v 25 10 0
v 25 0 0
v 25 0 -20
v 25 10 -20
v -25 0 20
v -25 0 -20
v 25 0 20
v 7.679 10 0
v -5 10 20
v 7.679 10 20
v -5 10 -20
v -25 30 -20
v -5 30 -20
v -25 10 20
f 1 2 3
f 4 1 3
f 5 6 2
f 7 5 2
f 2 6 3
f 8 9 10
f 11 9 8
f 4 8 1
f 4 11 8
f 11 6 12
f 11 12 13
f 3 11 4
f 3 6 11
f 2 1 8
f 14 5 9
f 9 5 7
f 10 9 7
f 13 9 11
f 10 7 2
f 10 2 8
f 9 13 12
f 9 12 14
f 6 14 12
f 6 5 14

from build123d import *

# Parameters (mm, degrees)
SKETCH1_W           = 50
SKETCH1_H           = 40
BOSS_EXTRUDE1_DEPTH = 10
CUT_EXTRUDE1_DEPTH  = 20
SKETCH3_W           = 20
SKETCH3_H           = 40
BOSS_EXTRUDE2_DEPTH = 20
CUT_EXTRUDE2_DEPTH  = 20


with BuildPart() as part:
    # Sketch1 → Boss-Extrude1 (new body)
    with BuildSketch(Plane(origin=(0, 0, 0), x_dir=(1, 0, 0), z_dir=(0, 1, 0))):
        Rectangle(SKETCH1_W, SKETCH1_H)
    extrude(amount=BOSS_EXTRUDE1_DEPTH)

    # Sketch2 → Cut-Extrude1 (cut)
    with BuildSketch(Plane.XY.offset(20)):
        Polygon((25, 0), (7.679491924, 10), (25, 10), align=None)
    extrude(amount=-CUT_EXTRUDE1_DEPTH, mode=Mode.SUBTRACT)

    # Sketch3 → Boss-Extrude2 (add)
    with BuildSketch(Plane(origin=(0, 10, 0), x_dir=(1, 0, 0), z_dir=(0, 1, 0))):
        with Locations((-15, 0)):
            Rectangle(SKETCH3_W, SKETCH3_H)
    extrude(amount=BOSS_EXTRUDE2_DEPTH)

    # Sketch4 → Cut-Extrude2 (cut)
    with BuildSketch(Plane(origin=(-5, 0, 0), x_dir=(0, 0, -1), z_dir=(1, 0, 0))):
        Polygon((20, 30), (-20, 10), (-20, 30), align=None)
    extrude(amount=-CUT_EXTRUDE2_DEPTH, mode=Mode.SUBTRACT)


solid = part.part
